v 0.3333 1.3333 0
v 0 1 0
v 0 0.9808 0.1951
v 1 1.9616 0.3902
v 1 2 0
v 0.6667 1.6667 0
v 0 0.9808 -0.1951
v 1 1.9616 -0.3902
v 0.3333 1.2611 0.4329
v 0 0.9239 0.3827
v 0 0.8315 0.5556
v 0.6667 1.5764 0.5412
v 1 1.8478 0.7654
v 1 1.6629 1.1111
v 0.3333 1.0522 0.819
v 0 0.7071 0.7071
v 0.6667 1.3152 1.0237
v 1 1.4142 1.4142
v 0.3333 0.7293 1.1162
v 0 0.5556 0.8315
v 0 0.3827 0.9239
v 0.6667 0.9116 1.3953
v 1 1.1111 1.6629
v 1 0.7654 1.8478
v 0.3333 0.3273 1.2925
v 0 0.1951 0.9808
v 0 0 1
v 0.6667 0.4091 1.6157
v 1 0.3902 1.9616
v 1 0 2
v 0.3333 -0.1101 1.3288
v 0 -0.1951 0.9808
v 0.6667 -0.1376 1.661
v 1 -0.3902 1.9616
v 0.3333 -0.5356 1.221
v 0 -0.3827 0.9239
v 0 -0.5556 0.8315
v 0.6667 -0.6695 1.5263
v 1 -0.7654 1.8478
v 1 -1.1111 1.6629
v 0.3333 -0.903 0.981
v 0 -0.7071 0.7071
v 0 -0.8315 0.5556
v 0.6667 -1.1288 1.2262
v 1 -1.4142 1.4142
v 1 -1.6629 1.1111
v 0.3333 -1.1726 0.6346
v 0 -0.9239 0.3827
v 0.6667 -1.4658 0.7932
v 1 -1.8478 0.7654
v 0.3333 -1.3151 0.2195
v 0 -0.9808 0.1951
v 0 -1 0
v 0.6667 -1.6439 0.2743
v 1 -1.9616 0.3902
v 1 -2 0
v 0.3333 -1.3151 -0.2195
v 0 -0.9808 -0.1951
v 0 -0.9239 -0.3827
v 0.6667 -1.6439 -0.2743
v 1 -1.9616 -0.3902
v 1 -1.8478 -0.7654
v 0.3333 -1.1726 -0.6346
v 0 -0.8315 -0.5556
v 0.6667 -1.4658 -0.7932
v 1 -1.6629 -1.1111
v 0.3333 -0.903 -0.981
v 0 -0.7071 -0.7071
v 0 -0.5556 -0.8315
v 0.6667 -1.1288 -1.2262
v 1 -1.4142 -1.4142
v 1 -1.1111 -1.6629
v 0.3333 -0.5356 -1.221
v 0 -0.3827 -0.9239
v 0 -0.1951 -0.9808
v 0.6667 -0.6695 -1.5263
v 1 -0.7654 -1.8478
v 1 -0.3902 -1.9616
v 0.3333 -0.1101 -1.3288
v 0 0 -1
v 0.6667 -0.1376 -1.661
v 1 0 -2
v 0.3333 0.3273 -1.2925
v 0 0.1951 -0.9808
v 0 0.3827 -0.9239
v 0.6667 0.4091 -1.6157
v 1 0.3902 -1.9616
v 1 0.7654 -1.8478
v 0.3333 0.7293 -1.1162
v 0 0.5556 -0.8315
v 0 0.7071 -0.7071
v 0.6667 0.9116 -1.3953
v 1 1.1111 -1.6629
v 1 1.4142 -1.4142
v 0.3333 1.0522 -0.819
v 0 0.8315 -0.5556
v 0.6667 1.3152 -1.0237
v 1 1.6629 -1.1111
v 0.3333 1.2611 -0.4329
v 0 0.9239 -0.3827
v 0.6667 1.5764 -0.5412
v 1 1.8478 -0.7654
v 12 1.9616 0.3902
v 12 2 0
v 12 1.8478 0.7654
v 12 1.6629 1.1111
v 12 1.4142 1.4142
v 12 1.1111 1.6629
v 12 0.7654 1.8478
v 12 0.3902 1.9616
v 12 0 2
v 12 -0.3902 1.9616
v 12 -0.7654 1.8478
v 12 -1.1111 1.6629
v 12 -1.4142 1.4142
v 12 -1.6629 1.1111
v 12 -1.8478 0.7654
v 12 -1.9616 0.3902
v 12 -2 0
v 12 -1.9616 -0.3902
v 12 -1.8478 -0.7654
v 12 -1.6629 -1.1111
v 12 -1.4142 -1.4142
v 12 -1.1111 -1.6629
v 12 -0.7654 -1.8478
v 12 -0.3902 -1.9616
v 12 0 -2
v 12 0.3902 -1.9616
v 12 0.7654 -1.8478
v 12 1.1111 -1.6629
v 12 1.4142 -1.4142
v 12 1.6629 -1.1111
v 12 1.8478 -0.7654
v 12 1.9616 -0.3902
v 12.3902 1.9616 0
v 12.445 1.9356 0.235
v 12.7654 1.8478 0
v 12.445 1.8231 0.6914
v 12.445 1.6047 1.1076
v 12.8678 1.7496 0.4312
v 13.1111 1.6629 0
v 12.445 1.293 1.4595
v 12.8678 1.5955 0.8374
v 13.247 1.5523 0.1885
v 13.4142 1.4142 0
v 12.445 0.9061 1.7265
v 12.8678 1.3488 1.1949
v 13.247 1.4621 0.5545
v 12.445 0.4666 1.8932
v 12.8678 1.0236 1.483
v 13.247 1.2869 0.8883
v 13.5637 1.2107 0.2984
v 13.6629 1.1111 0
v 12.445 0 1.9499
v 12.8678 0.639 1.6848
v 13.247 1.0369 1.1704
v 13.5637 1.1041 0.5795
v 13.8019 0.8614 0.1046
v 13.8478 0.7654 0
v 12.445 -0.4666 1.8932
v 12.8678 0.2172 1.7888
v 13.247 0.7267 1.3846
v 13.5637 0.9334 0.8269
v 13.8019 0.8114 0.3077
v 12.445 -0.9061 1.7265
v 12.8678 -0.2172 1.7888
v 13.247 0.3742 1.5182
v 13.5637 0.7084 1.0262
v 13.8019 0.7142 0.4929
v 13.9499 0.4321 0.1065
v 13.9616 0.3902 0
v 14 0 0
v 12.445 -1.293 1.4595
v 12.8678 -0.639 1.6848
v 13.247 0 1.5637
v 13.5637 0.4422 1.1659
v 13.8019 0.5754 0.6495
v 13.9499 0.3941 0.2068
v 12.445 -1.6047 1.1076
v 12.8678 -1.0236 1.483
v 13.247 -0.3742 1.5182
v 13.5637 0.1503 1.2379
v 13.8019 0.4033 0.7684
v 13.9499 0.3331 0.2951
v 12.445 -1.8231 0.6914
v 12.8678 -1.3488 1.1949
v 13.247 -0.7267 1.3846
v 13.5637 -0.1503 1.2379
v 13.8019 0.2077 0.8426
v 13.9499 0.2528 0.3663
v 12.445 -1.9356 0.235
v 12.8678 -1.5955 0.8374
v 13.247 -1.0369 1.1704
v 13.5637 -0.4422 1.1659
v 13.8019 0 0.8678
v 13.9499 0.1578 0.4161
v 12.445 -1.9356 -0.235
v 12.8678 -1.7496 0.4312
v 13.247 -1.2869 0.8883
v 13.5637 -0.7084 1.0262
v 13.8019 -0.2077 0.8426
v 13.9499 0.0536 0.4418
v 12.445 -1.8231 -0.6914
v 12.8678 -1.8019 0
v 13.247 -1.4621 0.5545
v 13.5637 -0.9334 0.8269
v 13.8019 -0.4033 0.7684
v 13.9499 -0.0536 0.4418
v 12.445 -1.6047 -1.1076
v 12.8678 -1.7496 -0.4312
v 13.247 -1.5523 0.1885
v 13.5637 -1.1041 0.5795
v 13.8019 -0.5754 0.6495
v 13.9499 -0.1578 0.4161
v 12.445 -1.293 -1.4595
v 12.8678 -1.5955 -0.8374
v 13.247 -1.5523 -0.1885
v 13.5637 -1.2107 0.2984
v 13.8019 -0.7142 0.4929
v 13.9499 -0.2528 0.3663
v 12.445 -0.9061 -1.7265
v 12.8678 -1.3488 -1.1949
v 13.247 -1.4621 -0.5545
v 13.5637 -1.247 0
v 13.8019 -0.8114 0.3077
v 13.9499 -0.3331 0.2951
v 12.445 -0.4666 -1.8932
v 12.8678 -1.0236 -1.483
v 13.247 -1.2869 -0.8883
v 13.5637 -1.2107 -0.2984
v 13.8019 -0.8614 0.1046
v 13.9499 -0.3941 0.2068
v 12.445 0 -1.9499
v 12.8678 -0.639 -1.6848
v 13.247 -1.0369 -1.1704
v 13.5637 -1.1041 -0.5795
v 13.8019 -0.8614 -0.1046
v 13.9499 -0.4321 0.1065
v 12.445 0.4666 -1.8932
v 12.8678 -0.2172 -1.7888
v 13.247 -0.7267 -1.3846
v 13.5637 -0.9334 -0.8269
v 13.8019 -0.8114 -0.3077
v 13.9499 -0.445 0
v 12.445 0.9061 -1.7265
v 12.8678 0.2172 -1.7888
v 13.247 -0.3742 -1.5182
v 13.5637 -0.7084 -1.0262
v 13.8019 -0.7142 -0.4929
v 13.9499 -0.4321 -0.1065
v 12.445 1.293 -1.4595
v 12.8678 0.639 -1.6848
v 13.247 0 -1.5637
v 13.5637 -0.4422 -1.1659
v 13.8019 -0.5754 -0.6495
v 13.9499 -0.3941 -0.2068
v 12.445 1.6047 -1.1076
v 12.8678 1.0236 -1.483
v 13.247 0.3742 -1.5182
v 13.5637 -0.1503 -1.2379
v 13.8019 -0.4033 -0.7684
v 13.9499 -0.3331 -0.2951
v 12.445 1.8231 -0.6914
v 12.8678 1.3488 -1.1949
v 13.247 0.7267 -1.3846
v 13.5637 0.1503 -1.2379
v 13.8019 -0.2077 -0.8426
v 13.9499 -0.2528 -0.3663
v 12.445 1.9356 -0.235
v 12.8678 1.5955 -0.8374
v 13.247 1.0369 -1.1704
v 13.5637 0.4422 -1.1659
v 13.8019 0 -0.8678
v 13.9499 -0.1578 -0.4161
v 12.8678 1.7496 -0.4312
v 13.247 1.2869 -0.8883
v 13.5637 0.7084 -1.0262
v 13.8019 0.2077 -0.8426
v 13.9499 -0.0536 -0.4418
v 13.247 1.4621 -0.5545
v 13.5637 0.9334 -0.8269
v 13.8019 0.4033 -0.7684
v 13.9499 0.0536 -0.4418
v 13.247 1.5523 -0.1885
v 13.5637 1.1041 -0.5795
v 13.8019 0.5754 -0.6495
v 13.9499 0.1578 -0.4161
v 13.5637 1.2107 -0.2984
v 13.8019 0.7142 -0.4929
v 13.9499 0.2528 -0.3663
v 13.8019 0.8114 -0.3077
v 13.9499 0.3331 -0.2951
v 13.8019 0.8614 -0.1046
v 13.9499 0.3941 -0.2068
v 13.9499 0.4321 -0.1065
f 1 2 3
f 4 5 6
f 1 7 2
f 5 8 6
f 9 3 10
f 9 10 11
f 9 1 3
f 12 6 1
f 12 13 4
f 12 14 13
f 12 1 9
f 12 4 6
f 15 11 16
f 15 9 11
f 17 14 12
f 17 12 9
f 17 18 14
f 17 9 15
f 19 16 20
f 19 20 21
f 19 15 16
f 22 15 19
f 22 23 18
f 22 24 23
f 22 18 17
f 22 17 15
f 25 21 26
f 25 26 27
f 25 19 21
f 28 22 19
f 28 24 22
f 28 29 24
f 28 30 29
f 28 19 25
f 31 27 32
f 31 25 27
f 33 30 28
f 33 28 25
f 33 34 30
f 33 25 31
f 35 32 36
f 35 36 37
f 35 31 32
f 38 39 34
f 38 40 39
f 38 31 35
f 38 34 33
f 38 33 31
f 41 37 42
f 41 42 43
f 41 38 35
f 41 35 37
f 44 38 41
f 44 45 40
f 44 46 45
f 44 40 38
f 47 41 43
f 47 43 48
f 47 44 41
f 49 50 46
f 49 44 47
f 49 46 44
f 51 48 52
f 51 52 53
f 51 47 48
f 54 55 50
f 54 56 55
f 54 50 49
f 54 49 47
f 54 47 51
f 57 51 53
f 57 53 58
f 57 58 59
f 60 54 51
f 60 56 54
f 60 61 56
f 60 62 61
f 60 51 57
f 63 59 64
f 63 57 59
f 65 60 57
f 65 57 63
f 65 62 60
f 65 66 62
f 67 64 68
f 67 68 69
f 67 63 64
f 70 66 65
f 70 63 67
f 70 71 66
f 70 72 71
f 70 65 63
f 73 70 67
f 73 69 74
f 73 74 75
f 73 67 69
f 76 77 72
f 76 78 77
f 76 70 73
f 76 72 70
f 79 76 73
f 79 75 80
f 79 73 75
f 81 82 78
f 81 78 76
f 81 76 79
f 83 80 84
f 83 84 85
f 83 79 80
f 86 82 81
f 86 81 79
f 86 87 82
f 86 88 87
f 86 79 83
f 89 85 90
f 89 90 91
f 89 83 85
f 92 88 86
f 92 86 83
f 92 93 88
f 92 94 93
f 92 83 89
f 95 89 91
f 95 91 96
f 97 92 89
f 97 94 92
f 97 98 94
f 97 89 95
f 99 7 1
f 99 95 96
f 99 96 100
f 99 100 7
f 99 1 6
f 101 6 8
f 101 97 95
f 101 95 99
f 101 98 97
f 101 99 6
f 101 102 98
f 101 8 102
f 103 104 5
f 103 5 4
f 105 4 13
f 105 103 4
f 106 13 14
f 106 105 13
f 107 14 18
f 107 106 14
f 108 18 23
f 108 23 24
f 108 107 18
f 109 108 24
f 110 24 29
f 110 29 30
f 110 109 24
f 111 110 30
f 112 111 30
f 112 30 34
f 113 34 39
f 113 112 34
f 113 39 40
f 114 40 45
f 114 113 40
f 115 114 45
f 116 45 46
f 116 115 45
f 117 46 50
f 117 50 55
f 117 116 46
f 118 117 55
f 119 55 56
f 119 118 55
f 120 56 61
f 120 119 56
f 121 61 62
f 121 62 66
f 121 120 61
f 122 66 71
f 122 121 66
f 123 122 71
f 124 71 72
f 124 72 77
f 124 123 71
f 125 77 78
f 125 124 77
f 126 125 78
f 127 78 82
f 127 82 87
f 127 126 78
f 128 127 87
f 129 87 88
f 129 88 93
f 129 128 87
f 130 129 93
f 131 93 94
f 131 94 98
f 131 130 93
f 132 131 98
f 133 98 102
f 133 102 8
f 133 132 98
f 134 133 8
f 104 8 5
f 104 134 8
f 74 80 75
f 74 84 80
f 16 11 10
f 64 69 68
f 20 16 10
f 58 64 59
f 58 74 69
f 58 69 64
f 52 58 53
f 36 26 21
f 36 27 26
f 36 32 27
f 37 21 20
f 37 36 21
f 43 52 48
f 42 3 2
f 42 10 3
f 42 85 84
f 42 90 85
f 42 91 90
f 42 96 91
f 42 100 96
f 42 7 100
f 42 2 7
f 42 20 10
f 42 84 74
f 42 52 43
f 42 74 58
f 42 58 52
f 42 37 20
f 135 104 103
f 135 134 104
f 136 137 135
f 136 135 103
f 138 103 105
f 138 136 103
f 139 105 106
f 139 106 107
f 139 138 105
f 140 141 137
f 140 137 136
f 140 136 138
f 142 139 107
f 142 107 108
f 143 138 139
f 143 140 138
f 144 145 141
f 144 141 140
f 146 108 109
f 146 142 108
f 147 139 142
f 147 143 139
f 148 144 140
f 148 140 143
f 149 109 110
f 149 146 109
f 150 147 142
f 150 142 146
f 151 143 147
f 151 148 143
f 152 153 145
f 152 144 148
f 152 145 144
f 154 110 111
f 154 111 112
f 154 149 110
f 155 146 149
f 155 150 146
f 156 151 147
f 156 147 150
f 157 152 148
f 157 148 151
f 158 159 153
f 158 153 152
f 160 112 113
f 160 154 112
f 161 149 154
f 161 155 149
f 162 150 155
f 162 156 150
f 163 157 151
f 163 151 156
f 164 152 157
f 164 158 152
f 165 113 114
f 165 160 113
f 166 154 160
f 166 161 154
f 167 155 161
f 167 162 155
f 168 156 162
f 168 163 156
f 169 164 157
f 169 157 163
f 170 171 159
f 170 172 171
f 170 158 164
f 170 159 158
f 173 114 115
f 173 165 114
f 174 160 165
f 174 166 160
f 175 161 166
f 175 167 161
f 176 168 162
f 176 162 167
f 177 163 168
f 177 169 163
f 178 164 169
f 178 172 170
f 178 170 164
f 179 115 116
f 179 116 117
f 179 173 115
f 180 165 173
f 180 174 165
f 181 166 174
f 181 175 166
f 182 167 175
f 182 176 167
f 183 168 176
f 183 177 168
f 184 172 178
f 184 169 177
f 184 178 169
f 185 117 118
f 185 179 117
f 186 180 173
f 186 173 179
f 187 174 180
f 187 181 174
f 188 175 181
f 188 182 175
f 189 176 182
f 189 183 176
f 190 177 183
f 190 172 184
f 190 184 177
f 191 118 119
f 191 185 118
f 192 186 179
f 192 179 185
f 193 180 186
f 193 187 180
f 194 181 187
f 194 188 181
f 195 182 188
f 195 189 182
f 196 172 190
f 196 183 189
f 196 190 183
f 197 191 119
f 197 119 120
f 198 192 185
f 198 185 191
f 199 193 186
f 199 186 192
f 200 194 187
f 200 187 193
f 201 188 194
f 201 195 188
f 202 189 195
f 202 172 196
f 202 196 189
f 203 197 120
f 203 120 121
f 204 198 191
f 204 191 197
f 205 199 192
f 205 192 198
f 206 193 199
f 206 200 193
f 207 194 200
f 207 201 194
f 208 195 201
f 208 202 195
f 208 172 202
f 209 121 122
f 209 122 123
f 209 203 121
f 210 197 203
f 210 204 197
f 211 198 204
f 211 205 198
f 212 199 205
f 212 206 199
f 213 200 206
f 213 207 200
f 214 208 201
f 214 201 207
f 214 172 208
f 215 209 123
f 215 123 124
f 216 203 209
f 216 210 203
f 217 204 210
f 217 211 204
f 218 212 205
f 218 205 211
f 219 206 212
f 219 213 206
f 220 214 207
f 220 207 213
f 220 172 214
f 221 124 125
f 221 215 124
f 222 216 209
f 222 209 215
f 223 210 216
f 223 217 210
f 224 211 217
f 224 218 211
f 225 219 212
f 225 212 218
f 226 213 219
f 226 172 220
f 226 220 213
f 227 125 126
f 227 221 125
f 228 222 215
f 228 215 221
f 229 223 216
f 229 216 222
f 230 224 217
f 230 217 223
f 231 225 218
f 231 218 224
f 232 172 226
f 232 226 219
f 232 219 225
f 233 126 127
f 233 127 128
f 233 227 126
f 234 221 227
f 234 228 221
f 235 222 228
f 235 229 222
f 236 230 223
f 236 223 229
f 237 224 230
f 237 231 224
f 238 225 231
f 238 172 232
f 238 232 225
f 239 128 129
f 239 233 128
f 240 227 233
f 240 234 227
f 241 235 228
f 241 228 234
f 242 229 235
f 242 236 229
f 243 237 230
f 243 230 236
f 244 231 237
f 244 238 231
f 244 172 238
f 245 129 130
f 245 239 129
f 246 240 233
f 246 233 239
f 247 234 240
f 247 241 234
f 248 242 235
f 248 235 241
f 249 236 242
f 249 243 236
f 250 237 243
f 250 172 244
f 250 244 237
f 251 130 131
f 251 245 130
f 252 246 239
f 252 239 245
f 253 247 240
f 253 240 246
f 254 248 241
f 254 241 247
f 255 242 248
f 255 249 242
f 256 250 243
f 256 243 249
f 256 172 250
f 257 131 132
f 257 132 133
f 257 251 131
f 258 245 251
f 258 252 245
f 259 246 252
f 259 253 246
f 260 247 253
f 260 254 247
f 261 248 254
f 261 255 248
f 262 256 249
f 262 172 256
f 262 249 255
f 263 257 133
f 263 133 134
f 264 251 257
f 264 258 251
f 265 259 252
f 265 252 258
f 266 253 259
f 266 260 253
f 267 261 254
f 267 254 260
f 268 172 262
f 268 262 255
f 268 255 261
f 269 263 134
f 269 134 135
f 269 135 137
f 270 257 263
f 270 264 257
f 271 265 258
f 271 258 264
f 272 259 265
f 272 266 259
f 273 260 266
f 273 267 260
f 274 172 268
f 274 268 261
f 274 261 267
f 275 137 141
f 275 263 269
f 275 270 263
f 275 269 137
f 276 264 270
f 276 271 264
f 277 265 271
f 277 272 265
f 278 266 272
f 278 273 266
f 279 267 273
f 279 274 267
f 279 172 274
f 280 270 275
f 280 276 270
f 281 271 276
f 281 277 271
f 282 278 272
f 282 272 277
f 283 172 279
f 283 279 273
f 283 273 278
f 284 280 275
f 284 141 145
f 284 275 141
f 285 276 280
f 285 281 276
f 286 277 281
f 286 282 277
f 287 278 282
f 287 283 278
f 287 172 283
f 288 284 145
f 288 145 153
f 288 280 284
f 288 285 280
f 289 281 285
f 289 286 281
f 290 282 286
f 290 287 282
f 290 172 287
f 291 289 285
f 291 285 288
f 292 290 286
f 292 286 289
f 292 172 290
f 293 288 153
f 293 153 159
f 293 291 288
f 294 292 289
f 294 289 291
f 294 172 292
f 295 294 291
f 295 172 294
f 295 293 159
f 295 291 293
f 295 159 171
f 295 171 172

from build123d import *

# Parameters (mm, degrees)
SKETCH1_W     = 14
SKETCH1_H     = 2
CHAMFER1_SIZE = 1
FILLET1_R     = 2


with BuildPart() as part:
    # Sketch1 → Revolve1 (revolve)
    with BuildSketch(Plane.XY):
        with Locations((7, 1)):
            Rectangle(SKETCH1_W, SKETCH1_H)
    revolve(axis=Axis((-4.801500481, 0, 0), (1, 0, 0)))

    # Chamfer1
    chamfer1_edges = [part.edges().sort_by_distance(p)[0] for p in [
        (0, -2, 0),
    ]]
    chamfer(chamfer1_edges, length=CHAMFER1_SIZE)

    # Fillet1
    fillet1_edges = [part.edges().sort_by_distance(p)[0] for p in [
        (14, -2, 0),
    ]]
    fillet(fillet1_edges, radius=FILLET1_R)


solid = part.part
